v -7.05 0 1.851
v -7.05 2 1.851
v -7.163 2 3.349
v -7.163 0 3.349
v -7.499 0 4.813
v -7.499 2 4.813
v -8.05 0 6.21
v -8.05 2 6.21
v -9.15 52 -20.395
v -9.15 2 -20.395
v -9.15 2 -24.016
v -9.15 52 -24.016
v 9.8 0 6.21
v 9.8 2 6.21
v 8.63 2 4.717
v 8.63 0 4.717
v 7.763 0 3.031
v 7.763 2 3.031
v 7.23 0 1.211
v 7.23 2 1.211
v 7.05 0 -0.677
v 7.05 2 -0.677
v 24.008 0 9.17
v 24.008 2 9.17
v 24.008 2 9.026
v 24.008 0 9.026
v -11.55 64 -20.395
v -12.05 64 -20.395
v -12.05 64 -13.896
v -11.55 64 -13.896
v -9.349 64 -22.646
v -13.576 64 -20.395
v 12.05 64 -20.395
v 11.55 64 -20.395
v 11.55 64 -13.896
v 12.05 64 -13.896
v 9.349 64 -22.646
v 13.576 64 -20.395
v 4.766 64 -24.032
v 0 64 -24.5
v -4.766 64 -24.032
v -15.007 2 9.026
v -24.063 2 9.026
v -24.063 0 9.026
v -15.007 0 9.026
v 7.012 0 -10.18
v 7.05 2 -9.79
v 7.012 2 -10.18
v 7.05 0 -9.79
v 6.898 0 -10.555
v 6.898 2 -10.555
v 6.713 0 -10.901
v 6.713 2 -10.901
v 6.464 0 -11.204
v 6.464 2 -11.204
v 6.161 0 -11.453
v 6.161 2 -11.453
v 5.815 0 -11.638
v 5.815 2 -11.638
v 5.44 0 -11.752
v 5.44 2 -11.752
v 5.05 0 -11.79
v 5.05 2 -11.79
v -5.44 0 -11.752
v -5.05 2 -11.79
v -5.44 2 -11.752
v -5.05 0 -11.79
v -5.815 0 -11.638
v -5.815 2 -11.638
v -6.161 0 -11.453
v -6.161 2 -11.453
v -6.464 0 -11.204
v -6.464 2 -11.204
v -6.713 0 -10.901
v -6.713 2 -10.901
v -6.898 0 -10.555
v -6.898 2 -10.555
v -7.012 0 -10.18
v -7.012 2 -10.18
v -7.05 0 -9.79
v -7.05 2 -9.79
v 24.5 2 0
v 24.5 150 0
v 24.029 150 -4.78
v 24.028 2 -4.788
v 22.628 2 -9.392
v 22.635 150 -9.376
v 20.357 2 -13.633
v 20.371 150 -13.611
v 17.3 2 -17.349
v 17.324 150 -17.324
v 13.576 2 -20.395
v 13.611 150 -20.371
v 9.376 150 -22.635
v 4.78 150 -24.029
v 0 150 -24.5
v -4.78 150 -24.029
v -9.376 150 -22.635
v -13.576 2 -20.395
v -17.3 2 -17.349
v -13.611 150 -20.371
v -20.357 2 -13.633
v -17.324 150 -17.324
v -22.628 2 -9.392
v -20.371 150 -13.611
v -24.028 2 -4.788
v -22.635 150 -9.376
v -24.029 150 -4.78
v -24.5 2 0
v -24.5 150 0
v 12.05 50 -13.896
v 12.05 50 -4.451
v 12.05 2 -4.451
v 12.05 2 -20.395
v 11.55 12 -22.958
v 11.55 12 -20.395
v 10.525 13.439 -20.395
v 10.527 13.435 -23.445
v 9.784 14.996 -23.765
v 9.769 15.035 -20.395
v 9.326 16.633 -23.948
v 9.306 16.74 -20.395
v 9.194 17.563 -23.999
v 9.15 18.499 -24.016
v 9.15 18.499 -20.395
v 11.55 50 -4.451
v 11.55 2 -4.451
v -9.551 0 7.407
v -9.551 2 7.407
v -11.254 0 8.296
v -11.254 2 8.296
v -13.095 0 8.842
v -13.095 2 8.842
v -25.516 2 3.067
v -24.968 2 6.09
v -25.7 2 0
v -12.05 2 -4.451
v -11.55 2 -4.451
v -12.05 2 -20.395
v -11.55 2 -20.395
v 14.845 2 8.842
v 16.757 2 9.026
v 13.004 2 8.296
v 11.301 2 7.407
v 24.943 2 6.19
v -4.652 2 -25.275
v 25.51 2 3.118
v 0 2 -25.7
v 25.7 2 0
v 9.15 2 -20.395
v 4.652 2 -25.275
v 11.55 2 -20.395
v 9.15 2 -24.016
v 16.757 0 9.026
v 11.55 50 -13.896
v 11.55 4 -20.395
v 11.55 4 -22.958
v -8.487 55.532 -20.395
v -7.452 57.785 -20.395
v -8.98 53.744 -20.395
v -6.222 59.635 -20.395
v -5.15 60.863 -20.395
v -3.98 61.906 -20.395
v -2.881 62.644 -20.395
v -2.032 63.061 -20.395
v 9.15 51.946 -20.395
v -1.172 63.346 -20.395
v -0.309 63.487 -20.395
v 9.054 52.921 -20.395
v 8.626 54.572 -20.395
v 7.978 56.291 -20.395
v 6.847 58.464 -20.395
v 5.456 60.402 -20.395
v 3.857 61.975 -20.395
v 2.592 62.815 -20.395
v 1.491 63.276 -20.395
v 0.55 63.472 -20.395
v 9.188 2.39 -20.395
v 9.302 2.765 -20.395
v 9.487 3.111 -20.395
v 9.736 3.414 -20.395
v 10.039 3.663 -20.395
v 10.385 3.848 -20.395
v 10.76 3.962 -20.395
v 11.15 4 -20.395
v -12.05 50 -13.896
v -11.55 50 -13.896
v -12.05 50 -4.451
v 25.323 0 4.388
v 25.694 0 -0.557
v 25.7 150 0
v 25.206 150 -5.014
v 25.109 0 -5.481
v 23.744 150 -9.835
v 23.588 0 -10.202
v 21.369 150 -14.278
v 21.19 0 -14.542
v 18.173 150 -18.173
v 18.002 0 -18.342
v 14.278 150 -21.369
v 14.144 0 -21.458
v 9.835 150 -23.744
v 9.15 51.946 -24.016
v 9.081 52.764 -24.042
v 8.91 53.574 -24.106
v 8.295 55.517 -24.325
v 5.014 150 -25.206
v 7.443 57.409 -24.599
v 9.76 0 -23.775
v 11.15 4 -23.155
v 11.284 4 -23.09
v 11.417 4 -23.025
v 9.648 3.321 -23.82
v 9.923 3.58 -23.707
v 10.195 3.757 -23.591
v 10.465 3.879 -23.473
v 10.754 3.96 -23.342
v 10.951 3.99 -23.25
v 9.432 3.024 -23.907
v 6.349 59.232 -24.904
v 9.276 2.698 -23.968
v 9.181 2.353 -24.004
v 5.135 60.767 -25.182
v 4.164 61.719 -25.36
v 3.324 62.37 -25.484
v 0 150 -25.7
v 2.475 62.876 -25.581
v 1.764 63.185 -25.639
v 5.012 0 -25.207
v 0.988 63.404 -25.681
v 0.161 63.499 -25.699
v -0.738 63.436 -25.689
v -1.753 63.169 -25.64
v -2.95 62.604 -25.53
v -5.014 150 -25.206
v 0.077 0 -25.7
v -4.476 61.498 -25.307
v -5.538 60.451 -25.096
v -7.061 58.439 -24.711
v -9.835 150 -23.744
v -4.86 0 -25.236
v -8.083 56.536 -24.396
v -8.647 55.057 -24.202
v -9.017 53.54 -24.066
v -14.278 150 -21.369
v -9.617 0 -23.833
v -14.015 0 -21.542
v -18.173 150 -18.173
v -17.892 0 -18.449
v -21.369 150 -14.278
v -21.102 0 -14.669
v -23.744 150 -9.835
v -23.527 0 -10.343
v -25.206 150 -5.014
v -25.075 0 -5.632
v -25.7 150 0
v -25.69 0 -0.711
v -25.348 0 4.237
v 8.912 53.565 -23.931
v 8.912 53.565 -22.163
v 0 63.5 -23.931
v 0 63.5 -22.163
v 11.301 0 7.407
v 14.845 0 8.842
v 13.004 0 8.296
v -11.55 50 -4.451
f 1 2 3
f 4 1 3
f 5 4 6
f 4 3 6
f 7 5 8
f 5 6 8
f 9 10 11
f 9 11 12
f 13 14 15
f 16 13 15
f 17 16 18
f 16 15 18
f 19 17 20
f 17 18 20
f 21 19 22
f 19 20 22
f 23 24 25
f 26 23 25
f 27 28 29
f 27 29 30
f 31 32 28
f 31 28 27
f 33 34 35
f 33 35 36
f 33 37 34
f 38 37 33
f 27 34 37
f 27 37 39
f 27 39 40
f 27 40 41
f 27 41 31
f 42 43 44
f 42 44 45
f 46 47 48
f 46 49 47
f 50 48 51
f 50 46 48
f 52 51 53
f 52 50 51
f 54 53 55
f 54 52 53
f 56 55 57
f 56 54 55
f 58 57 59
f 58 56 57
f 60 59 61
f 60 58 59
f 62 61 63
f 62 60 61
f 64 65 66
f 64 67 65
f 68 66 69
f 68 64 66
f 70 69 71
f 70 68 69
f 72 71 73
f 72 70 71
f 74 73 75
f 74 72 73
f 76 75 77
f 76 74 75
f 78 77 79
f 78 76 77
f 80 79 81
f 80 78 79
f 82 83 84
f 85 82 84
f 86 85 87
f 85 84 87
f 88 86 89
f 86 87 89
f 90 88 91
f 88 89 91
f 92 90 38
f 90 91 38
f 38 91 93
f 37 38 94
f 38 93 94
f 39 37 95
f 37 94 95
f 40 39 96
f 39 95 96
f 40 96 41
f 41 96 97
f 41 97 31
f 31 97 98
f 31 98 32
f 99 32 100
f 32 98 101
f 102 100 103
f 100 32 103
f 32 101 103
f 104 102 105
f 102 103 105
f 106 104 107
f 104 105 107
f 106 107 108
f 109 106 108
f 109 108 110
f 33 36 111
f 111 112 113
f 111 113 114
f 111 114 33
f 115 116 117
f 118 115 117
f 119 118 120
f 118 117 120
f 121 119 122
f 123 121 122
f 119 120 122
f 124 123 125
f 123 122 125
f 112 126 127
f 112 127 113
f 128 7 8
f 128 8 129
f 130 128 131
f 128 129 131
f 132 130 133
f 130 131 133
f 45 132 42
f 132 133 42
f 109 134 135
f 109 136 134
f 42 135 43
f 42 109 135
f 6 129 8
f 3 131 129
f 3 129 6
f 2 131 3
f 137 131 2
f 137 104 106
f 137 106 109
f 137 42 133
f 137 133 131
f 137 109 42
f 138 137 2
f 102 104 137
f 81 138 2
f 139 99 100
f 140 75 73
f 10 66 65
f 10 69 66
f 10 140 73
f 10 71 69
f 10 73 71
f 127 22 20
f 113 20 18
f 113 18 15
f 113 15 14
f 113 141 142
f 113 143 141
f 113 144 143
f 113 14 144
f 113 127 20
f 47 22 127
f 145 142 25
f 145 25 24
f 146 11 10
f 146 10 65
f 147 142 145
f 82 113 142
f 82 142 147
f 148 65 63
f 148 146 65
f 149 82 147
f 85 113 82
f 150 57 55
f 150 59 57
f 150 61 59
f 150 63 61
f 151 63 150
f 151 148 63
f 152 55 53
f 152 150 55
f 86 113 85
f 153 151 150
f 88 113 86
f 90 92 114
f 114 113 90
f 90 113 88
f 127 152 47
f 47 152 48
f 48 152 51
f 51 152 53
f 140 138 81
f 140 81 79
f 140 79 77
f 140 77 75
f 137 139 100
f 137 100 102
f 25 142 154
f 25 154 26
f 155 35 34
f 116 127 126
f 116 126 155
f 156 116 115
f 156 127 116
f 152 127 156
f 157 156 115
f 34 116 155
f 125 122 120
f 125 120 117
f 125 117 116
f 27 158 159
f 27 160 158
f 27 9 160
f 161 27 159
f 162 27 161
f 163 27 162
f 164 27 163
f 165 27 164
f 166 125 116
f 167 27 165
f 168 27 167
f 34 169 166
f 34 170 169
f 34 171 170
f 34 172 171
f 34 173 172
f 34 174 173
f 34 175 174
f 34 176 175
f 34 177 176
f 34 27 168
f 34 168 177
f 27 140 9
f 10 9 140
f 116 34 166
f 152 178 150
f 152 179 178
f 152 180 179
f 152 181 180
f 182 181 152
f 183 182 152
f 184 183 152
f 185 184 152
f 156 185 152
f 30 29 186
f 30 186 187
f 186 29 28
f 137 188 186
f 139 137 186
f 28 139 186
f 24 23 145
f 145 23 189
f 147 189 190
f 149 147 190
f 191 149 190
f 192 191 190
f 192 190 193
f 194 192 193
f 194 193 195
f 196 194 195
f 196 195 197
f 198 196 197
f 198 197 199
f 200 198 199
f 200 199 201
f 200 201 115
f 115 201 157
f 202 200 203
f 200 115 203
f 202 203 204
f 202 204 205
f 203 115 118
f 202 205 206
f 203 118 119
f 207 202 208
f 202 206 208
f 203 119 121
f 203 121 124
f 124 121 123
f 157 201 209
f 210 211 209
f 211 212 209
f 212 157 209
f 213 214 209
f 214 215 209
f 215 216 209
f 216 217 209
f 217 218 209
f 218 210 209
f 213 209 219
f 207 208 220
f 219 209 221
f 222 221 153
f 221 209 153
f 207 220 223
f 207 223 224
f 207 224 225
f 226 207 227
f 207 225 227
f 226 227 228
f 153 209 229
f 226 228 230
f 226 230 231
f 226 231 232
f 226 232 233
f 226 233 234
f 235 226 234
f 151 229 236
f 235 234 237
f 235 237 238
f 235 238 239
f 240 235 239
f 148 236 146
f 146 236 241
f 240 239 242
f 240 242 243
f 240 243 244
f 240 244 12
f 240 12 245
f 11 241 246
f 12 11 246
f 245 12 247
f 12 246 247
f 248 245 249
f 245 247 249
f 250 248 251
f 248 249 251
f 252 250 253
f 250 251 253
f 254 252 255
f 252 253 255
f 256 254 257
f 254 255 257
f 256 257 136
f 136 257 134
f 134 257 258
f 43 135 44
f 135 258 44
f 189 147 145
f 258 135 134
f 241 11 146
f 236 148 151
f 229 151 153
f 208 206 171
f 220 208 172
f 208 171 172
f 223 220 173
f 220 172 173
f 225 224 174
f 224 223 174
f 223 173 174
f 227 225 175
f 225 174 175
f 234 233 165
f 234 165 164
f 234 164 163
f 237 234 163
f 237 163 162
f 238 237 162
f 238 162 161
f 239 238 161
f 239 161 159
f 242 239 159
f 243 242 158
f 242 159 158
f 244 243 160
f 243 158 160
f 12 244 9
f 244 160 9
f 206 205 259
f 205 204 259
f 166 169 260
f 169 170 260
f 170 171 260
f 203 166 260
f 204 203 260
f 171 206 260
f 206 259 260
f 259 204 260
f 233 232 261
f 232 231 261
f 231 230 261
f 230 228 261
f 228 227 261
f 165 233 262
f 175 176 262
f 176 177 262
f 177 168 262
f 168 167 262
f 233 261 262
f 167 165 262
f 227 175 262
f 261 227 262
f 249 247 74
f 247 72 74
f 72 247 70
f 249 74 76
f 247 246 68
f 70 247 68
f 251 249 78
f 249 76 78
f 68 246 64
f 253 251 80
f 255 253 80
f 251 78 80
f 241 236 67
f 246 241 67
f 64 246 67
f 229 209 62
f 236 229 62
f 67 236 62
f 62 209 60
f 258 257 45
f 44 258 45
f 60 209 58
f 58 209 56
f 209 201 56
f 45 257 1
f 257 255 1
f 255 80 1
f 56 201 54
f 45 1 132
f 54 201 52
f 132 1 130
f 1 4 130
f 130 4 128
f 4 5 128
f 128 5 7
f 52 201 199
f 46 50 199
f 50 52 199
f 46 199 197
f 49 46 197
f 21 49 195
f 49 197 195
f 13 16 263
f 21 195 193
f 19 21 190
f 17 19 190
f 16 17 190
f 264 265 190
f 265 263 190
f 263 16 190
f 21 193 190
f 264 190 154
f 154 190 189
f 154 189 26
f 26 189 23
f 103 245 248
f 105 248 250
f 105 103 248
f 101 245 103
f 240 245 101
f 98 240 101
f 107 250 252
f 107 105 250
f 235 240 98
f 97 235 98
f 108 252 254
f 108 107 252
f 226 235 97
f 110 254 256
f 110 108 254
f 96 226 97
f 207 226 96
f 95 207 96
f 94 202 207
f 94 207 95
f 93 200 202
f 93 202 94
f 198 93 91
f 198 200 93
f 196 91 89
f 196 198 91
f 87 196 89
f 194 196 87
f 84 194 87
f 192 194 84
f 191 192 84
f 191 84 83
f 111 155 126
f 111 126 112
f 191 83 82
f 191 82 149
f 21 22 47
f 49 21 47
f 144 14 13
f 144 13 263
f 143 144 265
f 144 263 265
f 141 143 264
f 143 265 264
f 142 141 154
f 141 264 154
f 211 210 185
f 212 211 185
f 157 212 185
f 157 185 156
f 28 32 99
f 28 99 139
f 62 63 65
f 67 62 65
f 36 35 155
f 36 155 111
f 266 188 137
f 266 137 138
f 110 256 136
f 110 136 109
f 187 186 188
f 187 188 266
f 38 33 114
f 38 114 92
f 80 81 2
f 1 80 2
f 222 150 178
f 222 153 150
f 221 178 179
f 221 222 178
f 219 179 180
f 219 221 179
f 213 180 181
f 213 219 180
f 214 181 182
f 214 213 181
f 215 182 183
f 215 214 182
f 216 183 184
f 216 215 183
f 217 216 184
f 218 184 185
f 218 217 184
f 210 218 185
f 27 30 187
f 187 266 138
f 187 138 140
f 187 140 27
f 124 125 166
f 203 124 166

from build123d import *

# Parameters (mm, degrees)
SKETCH1_R               = 25.7
MAIN_CYLINDER_DEPTH     = 150
SKETCH4_R               = 24.5
MAIN_CUT_DOWN_DEPTH     = 148
SKETCH7_W               = 24.1
SKETCH7_H               = 31
FEATHER_BOX_DEPTH       = 62
FEATHER_HOLE_DEPTH      = 90
FEATHER_HOLE_DEPTH_BACK = 62
SKETCH8_W               = 23.1
SKETCH8_H               = 32
WINDOW_START            = 62
WINDOW_FILLER_DEPTH     = 62
SKETCH18_W              = 18.3
SKETCH18_H              = 50
WINDOW_CUT_DEPTH        = 16
SD_RESET_ACCESS_DEPTH   = 2
SKETCH26_W              = 0.5
SKETCH26_H              = 62
TRIM_DEPTH              = 15
FILLET3_R               = 10
SKETCH34_W              = 49.114786026
SKETCH34_H              = 17.457477886
CUT_EXTRUDE5_DEPTH      = 2
FILLET7_R               = 10
FILLET8_R               = 10
FILLET9_R               = 2
SKETCH28_W              = 2.4
SKETCH28_H              = 8
CUT_EXTRUDE6_DEPTH      = 10
FILLET10_R              = 10
FILLET11_R              = 2
SKETCH35_W              = 0.5
SKETCH35_H              = 9.444605522
CUT_EXTRUDE7_DEPTH      = 14


# Some blends are built 0.0001 mm under size
with BuildPart() as part:
    # Sketch1 → Main Cylinder (new body)
    with BuildSketch(Plane(origin=(0, 0, 0), x_dir=(1, 0, 0), z_dir=(0, 1, 0))):
        with Locations(Location((0, 0, 0), (0, 0, 270))):
            Circle(SKETCH1_R)
    extrude(amount=MAIN_CYLINDER_DEPTH)

    # Sketch4 → Main cut down (cut)
    with BuildSketch(Plane(origin=(0, 150, 0), x_dir=(1, 0, 0), z_dir=(0, 1, 0))):
        Circle(SKETCH4_R)
        Polygon((0, 0), (25.7, 0), (25.7, -40.6), (-25.7, -40.6), (-25.7, 0), align=None)
    extrude(amount=-MAIN_CUT_DOWN_DEPTH, mode=Mode.SUBTRACT)

    # Sketch7 → Feather box (add)
    with BuildSketch(Plane(origin=(0, 2, 0), x_dir=(1, 0, 0), z_dir=(0, 1, 0))):
        with Locations((0, 4.951216806)):
            Rectangle(SKETCH7_W, SKETCH7_H)
    extrude(amount=FEATHER_BOX_DEPTH)

    # Sketch8 → Feather hole (cut, two sides: drawn at the far end of the back side and taken through both)
    with BuildSketch(Plane(origin=(0, 64, 0), x_dir=(1, 0, 0), z_dir=(0, 1, 0)).offset(-FEATHER_HOLE_DEPTH_BACK)):
        with Locations((0, 4.451216806)):
            Rectangle(SKETCH8_W, SKETCH8_H)
    extrude(amount=FEATHER_HOLE_DEPTH + FEATHER_HOLE_DEPTH_BACK, mode=Mode.SUBTRACT)

    # Sketch15 → window filler (add)
    with BuildSketch(Plane(origin=(0, 2, 0), x_dir=(1, 0, 0), z_dir=(0, 1, 0)).offset(WINDOW_START)):
        with BuildLine():
            Line((-13.575571615, 20.394946809), (13.575571615, 20.394946809))
            ThreePointArc((13.575571615, 20.394946809), (0, 24.5), (-13.575571615, 20.394946809))
        make_face()
    extrude(amount=-WINDOW_FILLER_DEPTH)

    # Sketch18 → window cut (cut)
    with BuildSketch(Plane.XY.offset(-20.394946809)):
        with BuildLine():
            add(Edge.make_bspline(
                [(-9.15, 52), (-9.166701282, 56.998161016), (-0.16215998, 69.276496907), (8.559054188, 57.202948769), (9.892970994, 47.089830129), (-8.678000401, 46.988029764), (-9.148278475, 51.484802374), (-9.15, 52)],
                knots=[0, 0, 0, 0, 0.329948679, 0.626902491, 0.693907623, 0.965989736, 1, 1, 1, 1], degree=3))
        make_face()
        with Locations((0, 27)):
            Rectangle(SKETCH18_W, SKETCH18_H)
    extrude(amount=-WINDOW_CUT_DEPTH, mode=Mode.SUBTRACT)

    # Sketch23 → sd reset access (cut)
    with BuildSketch(Plane(origin=(0, 2, 0), x_dir=(1, 0, 0), z_dir=(0, 1, 0))):
        Polygon((-8.05, -11.21), (9.8, -11.21), (9.8, -6.21), (7.05, -6.21), (7.05, 11.79), (-7.05, 11.79), (-7.05, -6.21), (-8.05, -6.21), align=None)
    extrude(amount=-SD_RESET_ACCESS_DEPTH, mode=Mode.SUBTRACT)

    # Sketch26 → trim (cut)
    with BuildSketch(Plane.XY.offset(10.548783194)):
        with Locations((-11.8, 33)):
            Rectangle(SKETCH26_W, SKETCH26_H)
        with Locations((11.8, 33)):
            Rectangle(SKETCH26_W, SKETCH26_H)
    extrude(amount=-TRIM_DEPTH, mode=Mode.SUBTRACT)

    # Fillet3
    # the kernel refuses this fillet: 10 mm, written as the material it takes off along each edge
    with BuildSketch(Plane(origin=(-7.05, 12.897247359, 6.21), x_dir=(0, 0, -1), z_dir=(0, -1, 0))) as fillet3_piece_1:
        with BuildLine():
            CenterArc((4.358898944, -10), FILLET3_R, 90, 25.841932763)
            Line((0, -1), (-0.087177979, -0.82))
            ThreePointArc((-0.087177979, -0.82), (-0.2, -0.5), (-0.2, 0))
            Line((-0.2, 0), (0, 0.2))
            Line((0, 0.2), (4.358898944, 0.2))
            Line((4.358898944, 0.2), (4.358898944, 0))
        make_face()
    extrude(amount=23.794494718, mode=Mode.SUBTRACT)

    # Sketch34 → Cut-Extrude5 (cut)
    with BuildSketch(Plane(origin=(0, 2, 0), x_dir=(1, 0, 0), z_dir=(0, 1, 0))):
        with Locations((-0.549154382, -17.755029201)):
            Rectangle(SKETCH34_W, SKETCH34_H)
    extrude(amount=-CUT_EXTRUDE5_DEPTH, mode=Mode.SUBTRACT)

    # Fillet7
    # the kernel refuses this fillet: 10 mm, written as the material it takes off along each edge
    with BuildSketch(Plane(origin=(-8.05, 19.391505532, 9.026290258), x_dir=(-1, 0, 0), z_dir=(0, -1, 0))) as fillet7_piece_1:
        with BuildLine():
            CenterArc((6.956602213, 10), FILLET7_R, 225.920148316, 44.079851684)
            Line((0, 2.816290258), (-0.139132044, 2.672616063))
            ThreePointArc((-0.139132044, 2.672616063), (-0.2, 1.408145129), (-0.2, 0))
            Line((-0.2, 0), (0, -0.2))
            Line((0, -0.2), (6.956602213, -0.2))
            Line((6.956602213, -0.2), (6.956602213, 0))
        make_face()
    extrude(amount=36.783011063, mode=Mode.SUBTRACT)

    # Fillet8
    # the kernel refuses this fillet: 10 mm, written as the material it takes off along each edge
    with BuildSketch(Plane(origin=(9.8, -17.391505532, 9.026290258), x_dir=(1, 0, 0), z_dir=(0, 1, 0))) as fillet8_piece_1:
        with BuildLine():
            CenterArc((6.956602213, 10), FILLET8_R, 225.920148316, 44.079851684)
            Line((0, 2.816290258), (-0.139132044, 2.672616063))
            ThreePointArc((-0.139132044, 2.672616063), (-0.2, 1.408145129), (-0.2, 0))
            Line((-0.2, 0), (0, -0.2))
            Line((0, -0.2), (6.956602213, -0.2))
            Line((6.956602213, -0.2), (6.956602213, 0))
        make_face()
    extrude(amount=36.783011063, mode=Mode.SUBTRACT)
    with BuildSketch(Plane(origin=(7.05, 19.218721642, 6.21), x_dir=(1, 0, 0), z_dir=(0, -1, 0))) as fillet8_piece_2:
        with BuildLine():
            CenterArc((10, -6.887488657), FILLET8_R, 136.468847833, 43.531152167)
            Line((0, -6.887488657), (-0.2, -6.887488657))
            Line((-0.2, -6.887488657), (-0.2, 0))
            Line((-0.2, 0), (0, 0.2))
            ThreePointArc((0, 0.2), (1.375, 0.2), (2.605, 0.137749773))
            Line((2.605, 0.137749773), (2.75, 0))
        make_face()
    extrude(amount=36.437443285, mode=Mode.SUBTRACT)

    # Fillet9
    fillet9_edges = [part.edges().sort_by_distance(p)[0] for p in [
        (-7.05, 1, -11.79),
        (7.05, 1, -11.79),
    ]]
    fillet(fillet9_edges, radius=FILLET9_R)

    # Sketch28 → Cut-Extrude6 (cut)
    with BuildSketch(Plane.XY.offset(-20.394946809)):
        with Locations((10.35, 8)):
            Rectangle(SKETCH28_W, SKETCH28_H)
    extrude(amount=-CUT_EXTRUDE6_DEPTH, mode=Mode.SUBTRACT)

    # Fillet10
    # the kernel refuses this fillet: 10 mm, written as the material it takes off along each edge
    with BuildSketch(Plane(origin=(9.15, 12, -4.146869999), x_dir=(1, 0, 0), z_dir=(0, 0, -1))) as fillet10_piece_1:
        with BuildLine():
            CenterArc((10, -6.499230724), FILLET10_R, 139.464197889, 40.535802111)
            Line((0, -6.499230724), (-0.2, -6.499230724))
            Line((-0.2, -6.499230724), (-0.2, 0))
            Line((-0.2, 0), (0, 0.2))
            ThreePointArc((0, 0.2), (1.2, 0.2), (2.248, 0.129984614))
            Line((2.248, 0.129984614), (2.4, 0))
        make_face()
    extrude(amount=36.117191071, mode=Mode.SUBTRACT)

    # Fillet11
    fillet11_edges = [part.edges().sort_by_distance(p)[0] for p in [
        (9.15, 4, -22.205465534),
    ]]
    fillet(fillet11_edges, radius=FILLET11_R - 0.0001)  # a hair under: the kernel refuses the full size

    # Sketch35 → Cut-Extrude7 (cut)
    with BuildSketch(Plane(origin=(0, 64, 0), x_dir=(1, 0, 0), z_dir=(0, 1, 0))):
        with Locations((-11.8, 9.173519567)):
            Rectangle(SKETCH35_W, SKETCH35_H)
        with Locations((11.8, 9.173519567)):
            Rectangle(SKETCH35_W, SKETCH35_H)
    extrude(amount=-CUT_EXTRUDE7_DEPTH, mode=Mode.SUBTRACT)


solid = part.part
